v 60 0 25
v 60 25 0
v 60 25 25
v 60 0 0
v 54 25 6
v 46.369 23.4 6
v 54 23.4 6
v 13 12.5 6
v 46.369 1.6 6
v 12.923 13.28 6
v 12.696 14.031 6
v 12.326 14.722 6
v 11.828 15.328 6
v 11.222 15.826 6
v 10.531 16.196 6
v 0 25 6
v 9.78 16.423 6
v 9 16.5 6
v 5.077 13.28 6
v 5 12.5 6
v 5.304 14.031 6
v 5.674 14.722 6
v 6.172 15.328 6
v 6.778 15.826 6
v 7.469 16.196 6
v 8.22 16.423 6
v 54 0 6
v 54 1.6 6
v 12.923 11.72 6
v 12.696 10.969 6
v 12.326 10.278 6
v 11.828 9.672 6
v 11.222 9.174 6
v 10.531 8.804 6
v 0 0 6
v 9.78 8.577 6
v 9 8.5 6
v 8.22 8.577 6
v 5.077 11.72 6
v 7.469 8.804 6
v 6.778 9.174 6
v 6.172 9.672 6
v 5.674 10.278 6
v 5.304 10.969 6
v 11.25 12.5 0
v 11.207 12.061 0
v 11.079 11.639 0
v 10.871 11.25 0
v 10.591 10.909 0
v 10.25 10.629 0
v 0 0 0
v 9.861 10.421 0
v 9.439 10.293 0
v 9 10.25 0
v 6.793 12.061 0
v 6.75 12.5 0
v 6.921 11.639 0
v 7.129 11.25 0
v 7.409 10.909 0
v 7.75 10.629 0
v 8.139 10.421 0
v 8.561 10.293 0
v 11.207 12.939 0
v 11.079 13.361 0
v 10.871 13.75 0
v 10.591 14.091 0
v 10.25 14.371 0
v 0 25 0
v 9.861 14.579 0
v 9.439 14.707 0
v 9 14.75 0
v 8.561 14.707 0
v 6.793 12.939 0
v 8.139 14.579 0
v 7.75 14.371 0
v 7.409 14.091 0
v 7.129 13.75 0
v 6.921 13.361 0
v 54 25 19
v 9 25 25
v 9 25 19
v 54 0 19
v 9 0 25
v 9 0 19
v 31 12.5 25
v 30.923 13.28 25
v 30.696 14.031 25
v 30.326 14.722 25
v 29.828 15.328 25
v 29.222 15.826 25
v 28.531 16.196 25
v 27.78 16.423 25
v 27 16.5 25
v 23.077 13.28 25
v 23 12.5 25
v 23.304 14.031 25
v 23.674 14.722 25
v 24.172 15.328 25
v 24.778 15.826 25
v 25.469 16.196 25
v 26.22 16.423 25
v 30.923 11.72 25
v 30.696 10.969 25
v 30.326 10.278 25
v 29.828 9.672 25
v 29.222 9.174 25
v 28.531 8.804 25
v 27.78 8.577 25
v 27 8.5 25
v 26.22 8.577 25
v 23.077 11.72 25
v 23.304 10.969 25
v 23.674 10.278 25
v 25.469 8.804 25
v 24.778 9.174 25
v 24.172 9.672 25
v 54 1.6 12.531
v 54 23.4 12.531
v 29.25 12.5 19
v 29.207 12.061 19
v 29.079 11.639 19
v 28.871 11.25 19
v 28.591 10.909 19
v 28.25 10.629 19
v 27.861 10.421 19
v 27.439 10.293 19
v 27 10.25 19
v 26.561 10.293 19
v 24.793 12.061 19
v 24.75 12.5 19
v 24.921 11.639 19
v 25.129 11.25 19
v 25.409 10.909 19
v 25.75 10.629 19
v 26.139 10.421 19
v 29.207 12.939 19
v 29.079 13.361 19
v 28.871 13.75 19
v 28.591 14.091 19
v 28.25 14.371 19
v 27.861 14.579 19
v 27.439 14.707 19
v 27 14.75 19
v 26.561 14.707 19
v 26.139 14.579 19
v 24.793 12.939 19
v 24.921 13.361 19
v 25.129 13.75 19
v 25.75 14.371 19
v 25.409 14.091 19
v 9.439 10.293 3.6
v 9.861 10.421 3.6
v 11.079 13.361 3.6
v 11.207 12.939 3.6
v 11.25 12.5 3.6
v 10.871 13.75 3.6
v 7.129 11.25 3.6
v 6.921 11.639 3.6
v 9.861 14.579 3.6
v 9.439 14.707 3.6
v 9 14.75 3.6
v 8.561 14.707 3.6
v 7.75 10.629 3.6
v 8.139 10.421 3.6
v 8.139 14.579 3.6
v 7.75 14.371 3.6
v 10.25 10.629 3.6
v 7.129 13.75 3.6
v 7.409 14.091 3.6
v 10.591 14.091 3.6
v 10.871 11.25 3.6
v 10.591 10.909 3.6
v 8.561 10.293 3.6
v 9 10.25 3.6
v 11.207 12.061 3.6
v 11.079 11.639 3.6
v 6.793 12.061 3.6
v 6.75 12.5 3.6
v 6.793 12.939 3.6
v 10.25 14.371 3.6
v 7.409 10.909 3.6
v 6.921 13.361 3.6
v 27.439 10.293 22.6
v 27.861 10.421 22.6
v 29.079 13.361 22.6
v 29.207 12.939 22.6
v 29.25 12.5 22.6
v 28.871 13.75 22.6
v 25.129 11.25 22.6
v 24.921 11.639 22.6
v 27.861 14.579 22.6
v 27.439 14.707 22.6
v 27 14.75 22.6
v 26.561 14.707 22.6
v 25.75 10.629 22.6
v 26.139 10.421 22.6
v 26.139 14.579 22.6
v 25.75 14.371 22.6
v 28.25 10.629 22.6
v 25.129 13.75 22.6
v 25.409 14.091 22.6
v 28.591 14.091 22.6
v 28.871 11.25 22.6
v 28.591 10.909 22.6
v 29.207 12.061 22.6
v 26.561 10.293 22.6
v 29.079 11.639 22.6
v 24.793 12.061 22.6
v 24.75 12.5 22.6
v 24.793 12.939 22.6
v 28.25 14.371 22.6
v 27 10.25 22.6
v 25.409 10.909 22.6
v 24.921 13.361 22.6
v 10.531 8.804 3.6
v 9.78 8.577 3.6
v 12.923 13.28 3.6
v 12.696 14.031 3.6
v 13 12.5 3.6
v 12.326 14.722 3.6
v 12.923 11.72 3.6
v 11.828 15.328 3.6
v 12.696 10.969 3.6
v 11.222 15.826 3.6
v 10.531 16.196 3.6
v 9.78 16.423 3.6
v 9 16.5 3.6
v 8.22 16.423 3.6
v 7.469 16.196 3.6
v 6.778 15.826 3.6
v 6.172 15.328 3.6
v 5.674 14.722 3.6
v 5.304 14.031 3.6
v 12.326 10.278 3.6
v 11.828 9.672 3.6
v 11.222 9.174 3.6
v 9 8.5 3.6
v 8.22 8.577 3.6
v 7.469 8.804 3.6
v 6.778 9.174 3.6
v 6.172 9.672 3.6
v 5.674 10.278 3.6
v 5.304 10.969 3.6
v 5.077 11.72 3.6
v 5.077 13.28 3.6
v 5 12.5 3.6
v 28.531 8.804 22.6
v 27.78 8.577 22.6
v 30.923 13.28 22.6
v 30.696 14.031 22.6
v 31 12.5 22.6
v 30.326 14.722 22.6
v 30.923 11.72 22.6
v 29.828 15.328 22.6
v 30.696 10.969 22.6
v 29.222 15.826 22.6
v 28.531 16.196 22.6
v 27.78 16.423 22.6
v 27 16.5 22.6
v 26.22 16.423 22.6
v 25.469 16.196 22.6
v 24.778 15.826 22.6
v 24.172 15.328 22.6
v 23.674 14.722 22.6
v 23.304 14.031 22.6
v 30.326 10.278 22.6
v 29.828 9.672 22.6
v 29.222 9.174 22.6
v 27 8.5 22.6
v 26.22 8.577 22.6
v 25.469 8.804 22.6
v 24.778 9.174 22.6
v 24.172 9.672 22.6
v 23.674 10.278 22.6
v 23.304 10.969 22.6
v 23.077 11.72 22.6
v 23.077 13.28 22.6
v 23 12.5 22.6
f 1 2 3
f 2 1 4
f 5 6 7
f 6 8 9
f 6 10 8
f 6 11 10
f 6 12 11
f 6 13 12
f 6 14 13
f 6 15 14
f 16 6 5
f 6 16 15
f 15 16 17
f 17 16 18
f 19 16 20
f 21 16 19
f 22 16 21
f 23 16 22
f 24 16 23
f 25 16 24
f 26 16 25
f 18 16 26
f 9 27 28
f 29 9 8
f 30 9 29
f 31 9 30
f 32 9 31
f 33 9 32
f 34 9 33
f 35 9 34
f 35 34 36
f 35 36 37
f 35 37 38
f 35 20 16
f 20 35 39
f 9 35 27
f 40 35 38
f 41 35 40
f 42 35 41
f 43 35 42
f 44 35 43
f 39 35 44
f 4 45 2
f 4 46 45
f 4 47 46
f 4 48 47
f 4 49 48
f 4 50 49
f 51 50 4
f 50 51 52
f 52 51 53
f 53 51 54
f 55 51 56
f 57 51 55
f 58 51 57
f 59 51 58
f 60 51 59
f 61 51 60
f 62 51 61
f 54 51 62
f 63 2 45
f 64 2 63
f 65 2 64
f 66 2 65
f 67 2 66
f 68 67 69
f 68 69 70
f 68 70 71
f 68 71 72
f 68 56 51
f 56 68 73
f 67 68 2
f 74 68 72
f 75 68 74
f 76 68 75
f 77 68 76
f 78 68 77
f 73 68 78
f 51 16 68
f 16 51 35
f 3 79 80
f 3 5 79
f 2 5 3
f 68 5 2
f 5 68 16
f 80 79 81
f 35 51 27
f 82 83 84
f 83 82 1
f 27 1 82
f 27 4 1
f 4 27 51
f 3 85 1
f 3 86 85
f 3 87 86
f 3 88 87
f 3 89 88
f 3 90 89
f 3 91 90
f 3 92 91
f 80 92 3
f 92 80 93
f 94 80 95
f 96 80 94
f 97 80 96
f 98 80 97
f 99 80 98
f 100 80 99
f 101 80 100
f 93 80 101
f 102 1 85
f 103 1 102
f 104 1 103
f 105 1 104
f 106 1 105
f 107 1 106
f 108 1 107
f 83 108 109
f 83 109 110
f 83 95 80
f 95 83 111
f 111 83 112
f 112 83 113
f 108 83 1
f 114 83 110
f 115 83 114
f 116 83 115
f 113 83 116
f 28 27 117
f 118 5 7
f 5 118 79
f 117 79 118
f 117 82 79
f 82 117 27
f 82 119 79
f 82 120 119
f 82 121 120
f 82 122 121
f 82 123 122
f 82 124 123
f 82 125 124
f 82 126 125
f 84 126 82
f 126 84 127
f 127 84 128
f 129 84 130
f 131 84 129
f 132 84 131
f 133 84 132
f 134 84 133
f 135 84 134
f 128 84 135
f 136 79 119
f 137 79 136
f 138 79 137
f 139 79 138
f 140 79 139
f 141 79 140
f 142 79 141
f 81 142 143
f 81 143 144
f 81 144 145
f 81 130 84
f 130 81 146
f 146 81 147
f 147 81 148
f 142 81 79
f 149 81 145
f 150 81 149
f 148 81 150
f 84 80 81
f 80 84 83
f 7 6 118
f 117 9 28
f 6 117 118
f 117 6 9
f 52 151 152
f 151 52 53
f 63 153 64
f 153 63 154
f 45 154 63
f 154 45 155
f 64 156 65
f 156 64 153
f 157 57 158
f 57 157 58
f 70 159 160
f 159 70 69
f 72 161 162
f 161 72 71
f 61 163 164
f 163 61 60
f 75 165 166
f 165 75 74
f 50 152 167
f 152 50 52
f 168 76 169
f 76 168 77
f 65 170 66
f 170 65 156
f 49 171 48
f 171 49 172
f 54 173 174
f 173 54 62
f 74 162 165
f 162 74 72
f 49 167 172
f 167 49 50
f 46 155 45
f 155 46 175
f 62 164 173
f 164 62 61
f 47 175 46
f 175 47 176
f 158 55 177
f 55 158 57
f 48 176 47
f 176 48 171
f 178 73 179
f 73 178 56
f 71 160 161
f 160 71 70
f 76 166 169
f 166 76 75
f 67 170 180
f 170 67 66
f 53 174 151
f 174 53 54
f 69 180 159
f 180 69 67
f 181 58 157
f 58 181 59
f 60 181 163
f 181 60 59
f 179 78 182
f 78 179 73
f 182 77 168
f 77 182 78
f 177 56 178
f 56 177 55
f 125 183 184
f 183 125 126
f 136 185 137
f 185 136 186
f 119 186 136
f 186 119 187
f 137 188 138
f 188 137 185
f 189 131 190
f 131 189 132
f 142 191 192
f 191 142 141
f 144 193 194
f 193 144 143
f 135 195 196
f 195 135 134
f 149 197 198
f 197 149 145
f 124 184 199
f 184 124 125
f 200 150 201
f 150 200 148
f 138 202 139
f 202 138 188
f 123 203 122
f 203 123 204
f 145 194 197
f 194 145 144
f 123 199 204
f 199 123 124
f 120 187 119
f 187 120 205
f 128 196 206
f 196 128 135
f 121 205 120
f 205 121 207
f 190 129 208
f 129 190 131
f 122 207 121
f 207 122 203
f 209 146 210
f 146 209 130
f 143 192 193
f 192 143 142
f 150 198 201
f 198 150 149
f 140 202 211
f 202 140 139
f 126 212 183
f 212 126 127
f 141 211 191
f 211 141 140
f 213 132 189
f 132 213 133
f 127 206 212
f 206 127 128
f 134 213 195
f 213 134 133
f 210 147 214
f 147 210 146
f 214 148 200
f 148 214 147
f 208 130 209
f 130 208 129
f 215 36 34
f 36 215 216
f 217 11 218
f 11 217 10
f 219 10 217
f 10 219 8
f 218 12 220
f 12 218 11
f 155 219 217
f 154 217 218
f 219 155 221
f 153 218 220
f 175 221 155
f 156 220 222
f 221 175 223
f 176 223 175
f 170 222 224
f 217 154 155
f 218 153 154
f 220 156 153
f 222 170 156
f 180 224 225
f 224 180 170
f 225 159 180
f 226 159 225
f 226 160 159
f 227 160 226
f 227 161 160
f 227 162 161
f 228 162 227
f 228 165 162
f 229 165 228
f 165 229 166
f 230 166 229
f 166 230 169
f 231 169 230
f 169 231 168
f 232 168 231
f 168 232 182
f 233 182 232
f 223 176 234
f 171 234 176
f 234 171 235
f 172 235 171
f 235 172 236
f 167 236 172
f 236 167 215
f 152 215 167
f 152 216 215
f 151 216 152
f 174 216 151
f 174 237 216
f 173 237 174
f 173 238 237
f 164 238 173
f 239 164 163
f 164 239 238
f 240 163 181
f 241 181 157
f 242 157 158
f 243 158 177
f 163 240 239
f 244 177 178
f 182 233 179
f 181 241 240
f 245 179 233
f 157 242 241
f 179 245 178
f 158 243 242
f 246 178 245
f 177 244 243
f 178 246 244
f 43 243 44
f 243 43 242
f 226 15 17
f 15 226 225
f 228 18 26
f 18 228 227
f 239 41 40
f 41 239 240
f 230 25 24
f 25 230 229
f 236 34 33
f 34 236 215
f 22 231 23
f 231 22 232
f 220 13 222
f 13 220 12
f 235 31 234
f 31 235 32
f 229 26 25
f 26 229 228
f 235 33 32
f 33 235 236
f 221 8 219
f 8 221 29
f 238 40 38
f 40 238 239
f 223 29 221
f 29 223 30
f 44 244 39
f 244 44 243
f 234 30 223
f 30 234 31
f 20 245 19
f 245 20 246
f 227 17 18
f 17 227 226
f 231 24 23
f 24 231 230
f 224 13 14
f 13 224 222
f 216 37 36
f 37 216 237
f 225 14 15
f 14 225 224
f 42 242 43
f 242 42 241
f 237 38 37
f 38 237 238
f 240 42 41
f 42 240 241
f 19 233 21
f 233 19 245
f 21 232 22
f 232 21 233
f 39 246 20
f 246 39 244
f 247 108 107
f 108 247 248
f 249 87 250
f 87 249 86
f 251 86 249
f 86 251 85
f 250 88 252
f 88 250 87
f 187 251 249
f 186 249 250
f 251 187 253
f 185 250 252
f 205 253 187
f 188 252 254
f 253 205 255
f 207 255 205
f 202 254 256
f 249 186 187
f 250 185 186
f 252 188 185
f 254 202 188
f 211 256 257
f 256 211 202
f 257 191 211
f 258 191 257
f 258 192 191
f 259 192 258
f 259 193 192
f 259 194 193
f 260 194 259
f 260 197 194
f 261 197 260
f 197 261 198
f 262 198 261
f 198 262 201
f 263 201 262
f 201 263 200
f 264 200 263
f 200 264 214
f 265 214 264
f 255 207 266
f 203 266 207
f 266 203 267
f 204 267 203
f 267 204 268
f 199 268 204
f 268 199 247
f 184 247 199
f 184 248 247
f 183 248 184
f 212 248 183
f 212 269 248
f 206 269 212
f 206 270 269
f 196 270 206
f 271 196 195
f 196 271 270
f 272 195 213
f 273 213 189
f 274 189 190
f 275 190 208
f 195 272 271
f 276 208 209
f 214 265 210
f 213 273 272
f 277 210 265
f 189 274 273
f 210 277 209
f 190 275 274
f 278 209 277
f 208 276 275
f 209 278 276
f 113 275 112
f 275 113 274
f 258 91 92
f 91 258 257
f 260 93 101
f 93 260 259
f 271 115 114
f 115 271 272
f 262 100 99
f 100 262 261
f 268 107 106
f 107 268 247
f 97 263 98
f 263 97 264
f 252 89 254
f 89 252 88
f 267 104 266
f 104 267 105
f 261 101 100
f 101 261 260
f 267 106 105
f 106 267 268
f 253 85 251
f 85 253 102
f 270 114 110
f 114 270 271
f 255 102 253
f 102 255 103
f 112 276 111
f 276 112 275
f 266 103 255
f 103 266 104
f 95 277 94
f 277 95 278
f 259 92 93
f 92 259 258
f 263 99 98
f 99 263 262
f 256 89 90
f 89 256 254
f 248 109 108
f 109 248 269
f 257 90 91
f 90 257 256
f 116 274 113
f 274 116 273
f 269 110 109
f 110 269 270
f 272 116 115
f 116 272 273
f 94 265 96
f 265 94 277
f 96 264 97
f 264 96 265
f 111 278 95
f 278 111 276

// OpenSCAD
$fn = 32;

// ----------------------------------------------------------------------
// Z-bracket: 60 x 25 x 25 mm
// ----------------------------------------------------------------------

// --- parameters (mm) ---
lower_len = 60;           // lower foot length, X
upper_len = 45;           // upper foot length, X
width = 25;               // bracket width, Y
rise = 25;                // overall rise, Z
thick = 6;                // plate thickness
hole_d = 4.5;             // clearance for M4
cb_d = 8;                 // counterbore diameter
cb_h = 2.4;               // counterbore depth
rib_len = 9.5;            // gusset leg
rib_sink = 1.6;           // gusset overlap into the plates

module hole_z(px, py, z0) {
  translate([px, py, z0 - 2.5]) cylinder(h = thick + 5, d = hole_d);
}
module hole_x(py, pz) {
  translate([-2.5, py, pz]) rotate([0, 90, 0]) cylinder(h = thick + 5, d = hole_d);
}
module cb_z(px, py, top_z) {
  translate([px, py, top_z - cb_h]) cylinder(h = cb_h + 0.5, d = cb_d);
}
module cb_x(py, pz) {
  translate([thick - cb_h, py, pz]) rotate([0, -90, 0]) cylinder(h = cb_h + 0.5, d = cb_d);
}
module gusset(x0) {
  translate([x0, width - rib_sink, 0])
    rotate([90, 0, 0])
      linear_extrude(height = width - 2 * rib_sink)
        polygon(points = [[rib_sink, thick - rib_sink],
                          [rib_sink, thick - rib_sink + rib_len],
                          [-rib_len, thick - rib_sink]]);
}

difference() {
  union() {
    cube([lower_len, width, thick]);
    /* web, overlapping the lower foot */
    translate([lower_len - thick, 0, 0]) cube([thick, width, rise]);
    /* upper foot, sunk into the web */
    translate([lower_len - thick - upper_len, 0, rise - thick]) cube([upper_len + thick, width, thick]);
    gusset(lower_len - thick);
  }
  hole_z(9, 12.5, 0);
  translate([lower_len - thick - 27, 0, 0]) hole_z(0, 12.5, rise - thick);
  cb_z(9, 12.5, thick);
  translate([lower_len - thick - 27, 0, 0]) cb_z(0, 12.5, rise);
}
